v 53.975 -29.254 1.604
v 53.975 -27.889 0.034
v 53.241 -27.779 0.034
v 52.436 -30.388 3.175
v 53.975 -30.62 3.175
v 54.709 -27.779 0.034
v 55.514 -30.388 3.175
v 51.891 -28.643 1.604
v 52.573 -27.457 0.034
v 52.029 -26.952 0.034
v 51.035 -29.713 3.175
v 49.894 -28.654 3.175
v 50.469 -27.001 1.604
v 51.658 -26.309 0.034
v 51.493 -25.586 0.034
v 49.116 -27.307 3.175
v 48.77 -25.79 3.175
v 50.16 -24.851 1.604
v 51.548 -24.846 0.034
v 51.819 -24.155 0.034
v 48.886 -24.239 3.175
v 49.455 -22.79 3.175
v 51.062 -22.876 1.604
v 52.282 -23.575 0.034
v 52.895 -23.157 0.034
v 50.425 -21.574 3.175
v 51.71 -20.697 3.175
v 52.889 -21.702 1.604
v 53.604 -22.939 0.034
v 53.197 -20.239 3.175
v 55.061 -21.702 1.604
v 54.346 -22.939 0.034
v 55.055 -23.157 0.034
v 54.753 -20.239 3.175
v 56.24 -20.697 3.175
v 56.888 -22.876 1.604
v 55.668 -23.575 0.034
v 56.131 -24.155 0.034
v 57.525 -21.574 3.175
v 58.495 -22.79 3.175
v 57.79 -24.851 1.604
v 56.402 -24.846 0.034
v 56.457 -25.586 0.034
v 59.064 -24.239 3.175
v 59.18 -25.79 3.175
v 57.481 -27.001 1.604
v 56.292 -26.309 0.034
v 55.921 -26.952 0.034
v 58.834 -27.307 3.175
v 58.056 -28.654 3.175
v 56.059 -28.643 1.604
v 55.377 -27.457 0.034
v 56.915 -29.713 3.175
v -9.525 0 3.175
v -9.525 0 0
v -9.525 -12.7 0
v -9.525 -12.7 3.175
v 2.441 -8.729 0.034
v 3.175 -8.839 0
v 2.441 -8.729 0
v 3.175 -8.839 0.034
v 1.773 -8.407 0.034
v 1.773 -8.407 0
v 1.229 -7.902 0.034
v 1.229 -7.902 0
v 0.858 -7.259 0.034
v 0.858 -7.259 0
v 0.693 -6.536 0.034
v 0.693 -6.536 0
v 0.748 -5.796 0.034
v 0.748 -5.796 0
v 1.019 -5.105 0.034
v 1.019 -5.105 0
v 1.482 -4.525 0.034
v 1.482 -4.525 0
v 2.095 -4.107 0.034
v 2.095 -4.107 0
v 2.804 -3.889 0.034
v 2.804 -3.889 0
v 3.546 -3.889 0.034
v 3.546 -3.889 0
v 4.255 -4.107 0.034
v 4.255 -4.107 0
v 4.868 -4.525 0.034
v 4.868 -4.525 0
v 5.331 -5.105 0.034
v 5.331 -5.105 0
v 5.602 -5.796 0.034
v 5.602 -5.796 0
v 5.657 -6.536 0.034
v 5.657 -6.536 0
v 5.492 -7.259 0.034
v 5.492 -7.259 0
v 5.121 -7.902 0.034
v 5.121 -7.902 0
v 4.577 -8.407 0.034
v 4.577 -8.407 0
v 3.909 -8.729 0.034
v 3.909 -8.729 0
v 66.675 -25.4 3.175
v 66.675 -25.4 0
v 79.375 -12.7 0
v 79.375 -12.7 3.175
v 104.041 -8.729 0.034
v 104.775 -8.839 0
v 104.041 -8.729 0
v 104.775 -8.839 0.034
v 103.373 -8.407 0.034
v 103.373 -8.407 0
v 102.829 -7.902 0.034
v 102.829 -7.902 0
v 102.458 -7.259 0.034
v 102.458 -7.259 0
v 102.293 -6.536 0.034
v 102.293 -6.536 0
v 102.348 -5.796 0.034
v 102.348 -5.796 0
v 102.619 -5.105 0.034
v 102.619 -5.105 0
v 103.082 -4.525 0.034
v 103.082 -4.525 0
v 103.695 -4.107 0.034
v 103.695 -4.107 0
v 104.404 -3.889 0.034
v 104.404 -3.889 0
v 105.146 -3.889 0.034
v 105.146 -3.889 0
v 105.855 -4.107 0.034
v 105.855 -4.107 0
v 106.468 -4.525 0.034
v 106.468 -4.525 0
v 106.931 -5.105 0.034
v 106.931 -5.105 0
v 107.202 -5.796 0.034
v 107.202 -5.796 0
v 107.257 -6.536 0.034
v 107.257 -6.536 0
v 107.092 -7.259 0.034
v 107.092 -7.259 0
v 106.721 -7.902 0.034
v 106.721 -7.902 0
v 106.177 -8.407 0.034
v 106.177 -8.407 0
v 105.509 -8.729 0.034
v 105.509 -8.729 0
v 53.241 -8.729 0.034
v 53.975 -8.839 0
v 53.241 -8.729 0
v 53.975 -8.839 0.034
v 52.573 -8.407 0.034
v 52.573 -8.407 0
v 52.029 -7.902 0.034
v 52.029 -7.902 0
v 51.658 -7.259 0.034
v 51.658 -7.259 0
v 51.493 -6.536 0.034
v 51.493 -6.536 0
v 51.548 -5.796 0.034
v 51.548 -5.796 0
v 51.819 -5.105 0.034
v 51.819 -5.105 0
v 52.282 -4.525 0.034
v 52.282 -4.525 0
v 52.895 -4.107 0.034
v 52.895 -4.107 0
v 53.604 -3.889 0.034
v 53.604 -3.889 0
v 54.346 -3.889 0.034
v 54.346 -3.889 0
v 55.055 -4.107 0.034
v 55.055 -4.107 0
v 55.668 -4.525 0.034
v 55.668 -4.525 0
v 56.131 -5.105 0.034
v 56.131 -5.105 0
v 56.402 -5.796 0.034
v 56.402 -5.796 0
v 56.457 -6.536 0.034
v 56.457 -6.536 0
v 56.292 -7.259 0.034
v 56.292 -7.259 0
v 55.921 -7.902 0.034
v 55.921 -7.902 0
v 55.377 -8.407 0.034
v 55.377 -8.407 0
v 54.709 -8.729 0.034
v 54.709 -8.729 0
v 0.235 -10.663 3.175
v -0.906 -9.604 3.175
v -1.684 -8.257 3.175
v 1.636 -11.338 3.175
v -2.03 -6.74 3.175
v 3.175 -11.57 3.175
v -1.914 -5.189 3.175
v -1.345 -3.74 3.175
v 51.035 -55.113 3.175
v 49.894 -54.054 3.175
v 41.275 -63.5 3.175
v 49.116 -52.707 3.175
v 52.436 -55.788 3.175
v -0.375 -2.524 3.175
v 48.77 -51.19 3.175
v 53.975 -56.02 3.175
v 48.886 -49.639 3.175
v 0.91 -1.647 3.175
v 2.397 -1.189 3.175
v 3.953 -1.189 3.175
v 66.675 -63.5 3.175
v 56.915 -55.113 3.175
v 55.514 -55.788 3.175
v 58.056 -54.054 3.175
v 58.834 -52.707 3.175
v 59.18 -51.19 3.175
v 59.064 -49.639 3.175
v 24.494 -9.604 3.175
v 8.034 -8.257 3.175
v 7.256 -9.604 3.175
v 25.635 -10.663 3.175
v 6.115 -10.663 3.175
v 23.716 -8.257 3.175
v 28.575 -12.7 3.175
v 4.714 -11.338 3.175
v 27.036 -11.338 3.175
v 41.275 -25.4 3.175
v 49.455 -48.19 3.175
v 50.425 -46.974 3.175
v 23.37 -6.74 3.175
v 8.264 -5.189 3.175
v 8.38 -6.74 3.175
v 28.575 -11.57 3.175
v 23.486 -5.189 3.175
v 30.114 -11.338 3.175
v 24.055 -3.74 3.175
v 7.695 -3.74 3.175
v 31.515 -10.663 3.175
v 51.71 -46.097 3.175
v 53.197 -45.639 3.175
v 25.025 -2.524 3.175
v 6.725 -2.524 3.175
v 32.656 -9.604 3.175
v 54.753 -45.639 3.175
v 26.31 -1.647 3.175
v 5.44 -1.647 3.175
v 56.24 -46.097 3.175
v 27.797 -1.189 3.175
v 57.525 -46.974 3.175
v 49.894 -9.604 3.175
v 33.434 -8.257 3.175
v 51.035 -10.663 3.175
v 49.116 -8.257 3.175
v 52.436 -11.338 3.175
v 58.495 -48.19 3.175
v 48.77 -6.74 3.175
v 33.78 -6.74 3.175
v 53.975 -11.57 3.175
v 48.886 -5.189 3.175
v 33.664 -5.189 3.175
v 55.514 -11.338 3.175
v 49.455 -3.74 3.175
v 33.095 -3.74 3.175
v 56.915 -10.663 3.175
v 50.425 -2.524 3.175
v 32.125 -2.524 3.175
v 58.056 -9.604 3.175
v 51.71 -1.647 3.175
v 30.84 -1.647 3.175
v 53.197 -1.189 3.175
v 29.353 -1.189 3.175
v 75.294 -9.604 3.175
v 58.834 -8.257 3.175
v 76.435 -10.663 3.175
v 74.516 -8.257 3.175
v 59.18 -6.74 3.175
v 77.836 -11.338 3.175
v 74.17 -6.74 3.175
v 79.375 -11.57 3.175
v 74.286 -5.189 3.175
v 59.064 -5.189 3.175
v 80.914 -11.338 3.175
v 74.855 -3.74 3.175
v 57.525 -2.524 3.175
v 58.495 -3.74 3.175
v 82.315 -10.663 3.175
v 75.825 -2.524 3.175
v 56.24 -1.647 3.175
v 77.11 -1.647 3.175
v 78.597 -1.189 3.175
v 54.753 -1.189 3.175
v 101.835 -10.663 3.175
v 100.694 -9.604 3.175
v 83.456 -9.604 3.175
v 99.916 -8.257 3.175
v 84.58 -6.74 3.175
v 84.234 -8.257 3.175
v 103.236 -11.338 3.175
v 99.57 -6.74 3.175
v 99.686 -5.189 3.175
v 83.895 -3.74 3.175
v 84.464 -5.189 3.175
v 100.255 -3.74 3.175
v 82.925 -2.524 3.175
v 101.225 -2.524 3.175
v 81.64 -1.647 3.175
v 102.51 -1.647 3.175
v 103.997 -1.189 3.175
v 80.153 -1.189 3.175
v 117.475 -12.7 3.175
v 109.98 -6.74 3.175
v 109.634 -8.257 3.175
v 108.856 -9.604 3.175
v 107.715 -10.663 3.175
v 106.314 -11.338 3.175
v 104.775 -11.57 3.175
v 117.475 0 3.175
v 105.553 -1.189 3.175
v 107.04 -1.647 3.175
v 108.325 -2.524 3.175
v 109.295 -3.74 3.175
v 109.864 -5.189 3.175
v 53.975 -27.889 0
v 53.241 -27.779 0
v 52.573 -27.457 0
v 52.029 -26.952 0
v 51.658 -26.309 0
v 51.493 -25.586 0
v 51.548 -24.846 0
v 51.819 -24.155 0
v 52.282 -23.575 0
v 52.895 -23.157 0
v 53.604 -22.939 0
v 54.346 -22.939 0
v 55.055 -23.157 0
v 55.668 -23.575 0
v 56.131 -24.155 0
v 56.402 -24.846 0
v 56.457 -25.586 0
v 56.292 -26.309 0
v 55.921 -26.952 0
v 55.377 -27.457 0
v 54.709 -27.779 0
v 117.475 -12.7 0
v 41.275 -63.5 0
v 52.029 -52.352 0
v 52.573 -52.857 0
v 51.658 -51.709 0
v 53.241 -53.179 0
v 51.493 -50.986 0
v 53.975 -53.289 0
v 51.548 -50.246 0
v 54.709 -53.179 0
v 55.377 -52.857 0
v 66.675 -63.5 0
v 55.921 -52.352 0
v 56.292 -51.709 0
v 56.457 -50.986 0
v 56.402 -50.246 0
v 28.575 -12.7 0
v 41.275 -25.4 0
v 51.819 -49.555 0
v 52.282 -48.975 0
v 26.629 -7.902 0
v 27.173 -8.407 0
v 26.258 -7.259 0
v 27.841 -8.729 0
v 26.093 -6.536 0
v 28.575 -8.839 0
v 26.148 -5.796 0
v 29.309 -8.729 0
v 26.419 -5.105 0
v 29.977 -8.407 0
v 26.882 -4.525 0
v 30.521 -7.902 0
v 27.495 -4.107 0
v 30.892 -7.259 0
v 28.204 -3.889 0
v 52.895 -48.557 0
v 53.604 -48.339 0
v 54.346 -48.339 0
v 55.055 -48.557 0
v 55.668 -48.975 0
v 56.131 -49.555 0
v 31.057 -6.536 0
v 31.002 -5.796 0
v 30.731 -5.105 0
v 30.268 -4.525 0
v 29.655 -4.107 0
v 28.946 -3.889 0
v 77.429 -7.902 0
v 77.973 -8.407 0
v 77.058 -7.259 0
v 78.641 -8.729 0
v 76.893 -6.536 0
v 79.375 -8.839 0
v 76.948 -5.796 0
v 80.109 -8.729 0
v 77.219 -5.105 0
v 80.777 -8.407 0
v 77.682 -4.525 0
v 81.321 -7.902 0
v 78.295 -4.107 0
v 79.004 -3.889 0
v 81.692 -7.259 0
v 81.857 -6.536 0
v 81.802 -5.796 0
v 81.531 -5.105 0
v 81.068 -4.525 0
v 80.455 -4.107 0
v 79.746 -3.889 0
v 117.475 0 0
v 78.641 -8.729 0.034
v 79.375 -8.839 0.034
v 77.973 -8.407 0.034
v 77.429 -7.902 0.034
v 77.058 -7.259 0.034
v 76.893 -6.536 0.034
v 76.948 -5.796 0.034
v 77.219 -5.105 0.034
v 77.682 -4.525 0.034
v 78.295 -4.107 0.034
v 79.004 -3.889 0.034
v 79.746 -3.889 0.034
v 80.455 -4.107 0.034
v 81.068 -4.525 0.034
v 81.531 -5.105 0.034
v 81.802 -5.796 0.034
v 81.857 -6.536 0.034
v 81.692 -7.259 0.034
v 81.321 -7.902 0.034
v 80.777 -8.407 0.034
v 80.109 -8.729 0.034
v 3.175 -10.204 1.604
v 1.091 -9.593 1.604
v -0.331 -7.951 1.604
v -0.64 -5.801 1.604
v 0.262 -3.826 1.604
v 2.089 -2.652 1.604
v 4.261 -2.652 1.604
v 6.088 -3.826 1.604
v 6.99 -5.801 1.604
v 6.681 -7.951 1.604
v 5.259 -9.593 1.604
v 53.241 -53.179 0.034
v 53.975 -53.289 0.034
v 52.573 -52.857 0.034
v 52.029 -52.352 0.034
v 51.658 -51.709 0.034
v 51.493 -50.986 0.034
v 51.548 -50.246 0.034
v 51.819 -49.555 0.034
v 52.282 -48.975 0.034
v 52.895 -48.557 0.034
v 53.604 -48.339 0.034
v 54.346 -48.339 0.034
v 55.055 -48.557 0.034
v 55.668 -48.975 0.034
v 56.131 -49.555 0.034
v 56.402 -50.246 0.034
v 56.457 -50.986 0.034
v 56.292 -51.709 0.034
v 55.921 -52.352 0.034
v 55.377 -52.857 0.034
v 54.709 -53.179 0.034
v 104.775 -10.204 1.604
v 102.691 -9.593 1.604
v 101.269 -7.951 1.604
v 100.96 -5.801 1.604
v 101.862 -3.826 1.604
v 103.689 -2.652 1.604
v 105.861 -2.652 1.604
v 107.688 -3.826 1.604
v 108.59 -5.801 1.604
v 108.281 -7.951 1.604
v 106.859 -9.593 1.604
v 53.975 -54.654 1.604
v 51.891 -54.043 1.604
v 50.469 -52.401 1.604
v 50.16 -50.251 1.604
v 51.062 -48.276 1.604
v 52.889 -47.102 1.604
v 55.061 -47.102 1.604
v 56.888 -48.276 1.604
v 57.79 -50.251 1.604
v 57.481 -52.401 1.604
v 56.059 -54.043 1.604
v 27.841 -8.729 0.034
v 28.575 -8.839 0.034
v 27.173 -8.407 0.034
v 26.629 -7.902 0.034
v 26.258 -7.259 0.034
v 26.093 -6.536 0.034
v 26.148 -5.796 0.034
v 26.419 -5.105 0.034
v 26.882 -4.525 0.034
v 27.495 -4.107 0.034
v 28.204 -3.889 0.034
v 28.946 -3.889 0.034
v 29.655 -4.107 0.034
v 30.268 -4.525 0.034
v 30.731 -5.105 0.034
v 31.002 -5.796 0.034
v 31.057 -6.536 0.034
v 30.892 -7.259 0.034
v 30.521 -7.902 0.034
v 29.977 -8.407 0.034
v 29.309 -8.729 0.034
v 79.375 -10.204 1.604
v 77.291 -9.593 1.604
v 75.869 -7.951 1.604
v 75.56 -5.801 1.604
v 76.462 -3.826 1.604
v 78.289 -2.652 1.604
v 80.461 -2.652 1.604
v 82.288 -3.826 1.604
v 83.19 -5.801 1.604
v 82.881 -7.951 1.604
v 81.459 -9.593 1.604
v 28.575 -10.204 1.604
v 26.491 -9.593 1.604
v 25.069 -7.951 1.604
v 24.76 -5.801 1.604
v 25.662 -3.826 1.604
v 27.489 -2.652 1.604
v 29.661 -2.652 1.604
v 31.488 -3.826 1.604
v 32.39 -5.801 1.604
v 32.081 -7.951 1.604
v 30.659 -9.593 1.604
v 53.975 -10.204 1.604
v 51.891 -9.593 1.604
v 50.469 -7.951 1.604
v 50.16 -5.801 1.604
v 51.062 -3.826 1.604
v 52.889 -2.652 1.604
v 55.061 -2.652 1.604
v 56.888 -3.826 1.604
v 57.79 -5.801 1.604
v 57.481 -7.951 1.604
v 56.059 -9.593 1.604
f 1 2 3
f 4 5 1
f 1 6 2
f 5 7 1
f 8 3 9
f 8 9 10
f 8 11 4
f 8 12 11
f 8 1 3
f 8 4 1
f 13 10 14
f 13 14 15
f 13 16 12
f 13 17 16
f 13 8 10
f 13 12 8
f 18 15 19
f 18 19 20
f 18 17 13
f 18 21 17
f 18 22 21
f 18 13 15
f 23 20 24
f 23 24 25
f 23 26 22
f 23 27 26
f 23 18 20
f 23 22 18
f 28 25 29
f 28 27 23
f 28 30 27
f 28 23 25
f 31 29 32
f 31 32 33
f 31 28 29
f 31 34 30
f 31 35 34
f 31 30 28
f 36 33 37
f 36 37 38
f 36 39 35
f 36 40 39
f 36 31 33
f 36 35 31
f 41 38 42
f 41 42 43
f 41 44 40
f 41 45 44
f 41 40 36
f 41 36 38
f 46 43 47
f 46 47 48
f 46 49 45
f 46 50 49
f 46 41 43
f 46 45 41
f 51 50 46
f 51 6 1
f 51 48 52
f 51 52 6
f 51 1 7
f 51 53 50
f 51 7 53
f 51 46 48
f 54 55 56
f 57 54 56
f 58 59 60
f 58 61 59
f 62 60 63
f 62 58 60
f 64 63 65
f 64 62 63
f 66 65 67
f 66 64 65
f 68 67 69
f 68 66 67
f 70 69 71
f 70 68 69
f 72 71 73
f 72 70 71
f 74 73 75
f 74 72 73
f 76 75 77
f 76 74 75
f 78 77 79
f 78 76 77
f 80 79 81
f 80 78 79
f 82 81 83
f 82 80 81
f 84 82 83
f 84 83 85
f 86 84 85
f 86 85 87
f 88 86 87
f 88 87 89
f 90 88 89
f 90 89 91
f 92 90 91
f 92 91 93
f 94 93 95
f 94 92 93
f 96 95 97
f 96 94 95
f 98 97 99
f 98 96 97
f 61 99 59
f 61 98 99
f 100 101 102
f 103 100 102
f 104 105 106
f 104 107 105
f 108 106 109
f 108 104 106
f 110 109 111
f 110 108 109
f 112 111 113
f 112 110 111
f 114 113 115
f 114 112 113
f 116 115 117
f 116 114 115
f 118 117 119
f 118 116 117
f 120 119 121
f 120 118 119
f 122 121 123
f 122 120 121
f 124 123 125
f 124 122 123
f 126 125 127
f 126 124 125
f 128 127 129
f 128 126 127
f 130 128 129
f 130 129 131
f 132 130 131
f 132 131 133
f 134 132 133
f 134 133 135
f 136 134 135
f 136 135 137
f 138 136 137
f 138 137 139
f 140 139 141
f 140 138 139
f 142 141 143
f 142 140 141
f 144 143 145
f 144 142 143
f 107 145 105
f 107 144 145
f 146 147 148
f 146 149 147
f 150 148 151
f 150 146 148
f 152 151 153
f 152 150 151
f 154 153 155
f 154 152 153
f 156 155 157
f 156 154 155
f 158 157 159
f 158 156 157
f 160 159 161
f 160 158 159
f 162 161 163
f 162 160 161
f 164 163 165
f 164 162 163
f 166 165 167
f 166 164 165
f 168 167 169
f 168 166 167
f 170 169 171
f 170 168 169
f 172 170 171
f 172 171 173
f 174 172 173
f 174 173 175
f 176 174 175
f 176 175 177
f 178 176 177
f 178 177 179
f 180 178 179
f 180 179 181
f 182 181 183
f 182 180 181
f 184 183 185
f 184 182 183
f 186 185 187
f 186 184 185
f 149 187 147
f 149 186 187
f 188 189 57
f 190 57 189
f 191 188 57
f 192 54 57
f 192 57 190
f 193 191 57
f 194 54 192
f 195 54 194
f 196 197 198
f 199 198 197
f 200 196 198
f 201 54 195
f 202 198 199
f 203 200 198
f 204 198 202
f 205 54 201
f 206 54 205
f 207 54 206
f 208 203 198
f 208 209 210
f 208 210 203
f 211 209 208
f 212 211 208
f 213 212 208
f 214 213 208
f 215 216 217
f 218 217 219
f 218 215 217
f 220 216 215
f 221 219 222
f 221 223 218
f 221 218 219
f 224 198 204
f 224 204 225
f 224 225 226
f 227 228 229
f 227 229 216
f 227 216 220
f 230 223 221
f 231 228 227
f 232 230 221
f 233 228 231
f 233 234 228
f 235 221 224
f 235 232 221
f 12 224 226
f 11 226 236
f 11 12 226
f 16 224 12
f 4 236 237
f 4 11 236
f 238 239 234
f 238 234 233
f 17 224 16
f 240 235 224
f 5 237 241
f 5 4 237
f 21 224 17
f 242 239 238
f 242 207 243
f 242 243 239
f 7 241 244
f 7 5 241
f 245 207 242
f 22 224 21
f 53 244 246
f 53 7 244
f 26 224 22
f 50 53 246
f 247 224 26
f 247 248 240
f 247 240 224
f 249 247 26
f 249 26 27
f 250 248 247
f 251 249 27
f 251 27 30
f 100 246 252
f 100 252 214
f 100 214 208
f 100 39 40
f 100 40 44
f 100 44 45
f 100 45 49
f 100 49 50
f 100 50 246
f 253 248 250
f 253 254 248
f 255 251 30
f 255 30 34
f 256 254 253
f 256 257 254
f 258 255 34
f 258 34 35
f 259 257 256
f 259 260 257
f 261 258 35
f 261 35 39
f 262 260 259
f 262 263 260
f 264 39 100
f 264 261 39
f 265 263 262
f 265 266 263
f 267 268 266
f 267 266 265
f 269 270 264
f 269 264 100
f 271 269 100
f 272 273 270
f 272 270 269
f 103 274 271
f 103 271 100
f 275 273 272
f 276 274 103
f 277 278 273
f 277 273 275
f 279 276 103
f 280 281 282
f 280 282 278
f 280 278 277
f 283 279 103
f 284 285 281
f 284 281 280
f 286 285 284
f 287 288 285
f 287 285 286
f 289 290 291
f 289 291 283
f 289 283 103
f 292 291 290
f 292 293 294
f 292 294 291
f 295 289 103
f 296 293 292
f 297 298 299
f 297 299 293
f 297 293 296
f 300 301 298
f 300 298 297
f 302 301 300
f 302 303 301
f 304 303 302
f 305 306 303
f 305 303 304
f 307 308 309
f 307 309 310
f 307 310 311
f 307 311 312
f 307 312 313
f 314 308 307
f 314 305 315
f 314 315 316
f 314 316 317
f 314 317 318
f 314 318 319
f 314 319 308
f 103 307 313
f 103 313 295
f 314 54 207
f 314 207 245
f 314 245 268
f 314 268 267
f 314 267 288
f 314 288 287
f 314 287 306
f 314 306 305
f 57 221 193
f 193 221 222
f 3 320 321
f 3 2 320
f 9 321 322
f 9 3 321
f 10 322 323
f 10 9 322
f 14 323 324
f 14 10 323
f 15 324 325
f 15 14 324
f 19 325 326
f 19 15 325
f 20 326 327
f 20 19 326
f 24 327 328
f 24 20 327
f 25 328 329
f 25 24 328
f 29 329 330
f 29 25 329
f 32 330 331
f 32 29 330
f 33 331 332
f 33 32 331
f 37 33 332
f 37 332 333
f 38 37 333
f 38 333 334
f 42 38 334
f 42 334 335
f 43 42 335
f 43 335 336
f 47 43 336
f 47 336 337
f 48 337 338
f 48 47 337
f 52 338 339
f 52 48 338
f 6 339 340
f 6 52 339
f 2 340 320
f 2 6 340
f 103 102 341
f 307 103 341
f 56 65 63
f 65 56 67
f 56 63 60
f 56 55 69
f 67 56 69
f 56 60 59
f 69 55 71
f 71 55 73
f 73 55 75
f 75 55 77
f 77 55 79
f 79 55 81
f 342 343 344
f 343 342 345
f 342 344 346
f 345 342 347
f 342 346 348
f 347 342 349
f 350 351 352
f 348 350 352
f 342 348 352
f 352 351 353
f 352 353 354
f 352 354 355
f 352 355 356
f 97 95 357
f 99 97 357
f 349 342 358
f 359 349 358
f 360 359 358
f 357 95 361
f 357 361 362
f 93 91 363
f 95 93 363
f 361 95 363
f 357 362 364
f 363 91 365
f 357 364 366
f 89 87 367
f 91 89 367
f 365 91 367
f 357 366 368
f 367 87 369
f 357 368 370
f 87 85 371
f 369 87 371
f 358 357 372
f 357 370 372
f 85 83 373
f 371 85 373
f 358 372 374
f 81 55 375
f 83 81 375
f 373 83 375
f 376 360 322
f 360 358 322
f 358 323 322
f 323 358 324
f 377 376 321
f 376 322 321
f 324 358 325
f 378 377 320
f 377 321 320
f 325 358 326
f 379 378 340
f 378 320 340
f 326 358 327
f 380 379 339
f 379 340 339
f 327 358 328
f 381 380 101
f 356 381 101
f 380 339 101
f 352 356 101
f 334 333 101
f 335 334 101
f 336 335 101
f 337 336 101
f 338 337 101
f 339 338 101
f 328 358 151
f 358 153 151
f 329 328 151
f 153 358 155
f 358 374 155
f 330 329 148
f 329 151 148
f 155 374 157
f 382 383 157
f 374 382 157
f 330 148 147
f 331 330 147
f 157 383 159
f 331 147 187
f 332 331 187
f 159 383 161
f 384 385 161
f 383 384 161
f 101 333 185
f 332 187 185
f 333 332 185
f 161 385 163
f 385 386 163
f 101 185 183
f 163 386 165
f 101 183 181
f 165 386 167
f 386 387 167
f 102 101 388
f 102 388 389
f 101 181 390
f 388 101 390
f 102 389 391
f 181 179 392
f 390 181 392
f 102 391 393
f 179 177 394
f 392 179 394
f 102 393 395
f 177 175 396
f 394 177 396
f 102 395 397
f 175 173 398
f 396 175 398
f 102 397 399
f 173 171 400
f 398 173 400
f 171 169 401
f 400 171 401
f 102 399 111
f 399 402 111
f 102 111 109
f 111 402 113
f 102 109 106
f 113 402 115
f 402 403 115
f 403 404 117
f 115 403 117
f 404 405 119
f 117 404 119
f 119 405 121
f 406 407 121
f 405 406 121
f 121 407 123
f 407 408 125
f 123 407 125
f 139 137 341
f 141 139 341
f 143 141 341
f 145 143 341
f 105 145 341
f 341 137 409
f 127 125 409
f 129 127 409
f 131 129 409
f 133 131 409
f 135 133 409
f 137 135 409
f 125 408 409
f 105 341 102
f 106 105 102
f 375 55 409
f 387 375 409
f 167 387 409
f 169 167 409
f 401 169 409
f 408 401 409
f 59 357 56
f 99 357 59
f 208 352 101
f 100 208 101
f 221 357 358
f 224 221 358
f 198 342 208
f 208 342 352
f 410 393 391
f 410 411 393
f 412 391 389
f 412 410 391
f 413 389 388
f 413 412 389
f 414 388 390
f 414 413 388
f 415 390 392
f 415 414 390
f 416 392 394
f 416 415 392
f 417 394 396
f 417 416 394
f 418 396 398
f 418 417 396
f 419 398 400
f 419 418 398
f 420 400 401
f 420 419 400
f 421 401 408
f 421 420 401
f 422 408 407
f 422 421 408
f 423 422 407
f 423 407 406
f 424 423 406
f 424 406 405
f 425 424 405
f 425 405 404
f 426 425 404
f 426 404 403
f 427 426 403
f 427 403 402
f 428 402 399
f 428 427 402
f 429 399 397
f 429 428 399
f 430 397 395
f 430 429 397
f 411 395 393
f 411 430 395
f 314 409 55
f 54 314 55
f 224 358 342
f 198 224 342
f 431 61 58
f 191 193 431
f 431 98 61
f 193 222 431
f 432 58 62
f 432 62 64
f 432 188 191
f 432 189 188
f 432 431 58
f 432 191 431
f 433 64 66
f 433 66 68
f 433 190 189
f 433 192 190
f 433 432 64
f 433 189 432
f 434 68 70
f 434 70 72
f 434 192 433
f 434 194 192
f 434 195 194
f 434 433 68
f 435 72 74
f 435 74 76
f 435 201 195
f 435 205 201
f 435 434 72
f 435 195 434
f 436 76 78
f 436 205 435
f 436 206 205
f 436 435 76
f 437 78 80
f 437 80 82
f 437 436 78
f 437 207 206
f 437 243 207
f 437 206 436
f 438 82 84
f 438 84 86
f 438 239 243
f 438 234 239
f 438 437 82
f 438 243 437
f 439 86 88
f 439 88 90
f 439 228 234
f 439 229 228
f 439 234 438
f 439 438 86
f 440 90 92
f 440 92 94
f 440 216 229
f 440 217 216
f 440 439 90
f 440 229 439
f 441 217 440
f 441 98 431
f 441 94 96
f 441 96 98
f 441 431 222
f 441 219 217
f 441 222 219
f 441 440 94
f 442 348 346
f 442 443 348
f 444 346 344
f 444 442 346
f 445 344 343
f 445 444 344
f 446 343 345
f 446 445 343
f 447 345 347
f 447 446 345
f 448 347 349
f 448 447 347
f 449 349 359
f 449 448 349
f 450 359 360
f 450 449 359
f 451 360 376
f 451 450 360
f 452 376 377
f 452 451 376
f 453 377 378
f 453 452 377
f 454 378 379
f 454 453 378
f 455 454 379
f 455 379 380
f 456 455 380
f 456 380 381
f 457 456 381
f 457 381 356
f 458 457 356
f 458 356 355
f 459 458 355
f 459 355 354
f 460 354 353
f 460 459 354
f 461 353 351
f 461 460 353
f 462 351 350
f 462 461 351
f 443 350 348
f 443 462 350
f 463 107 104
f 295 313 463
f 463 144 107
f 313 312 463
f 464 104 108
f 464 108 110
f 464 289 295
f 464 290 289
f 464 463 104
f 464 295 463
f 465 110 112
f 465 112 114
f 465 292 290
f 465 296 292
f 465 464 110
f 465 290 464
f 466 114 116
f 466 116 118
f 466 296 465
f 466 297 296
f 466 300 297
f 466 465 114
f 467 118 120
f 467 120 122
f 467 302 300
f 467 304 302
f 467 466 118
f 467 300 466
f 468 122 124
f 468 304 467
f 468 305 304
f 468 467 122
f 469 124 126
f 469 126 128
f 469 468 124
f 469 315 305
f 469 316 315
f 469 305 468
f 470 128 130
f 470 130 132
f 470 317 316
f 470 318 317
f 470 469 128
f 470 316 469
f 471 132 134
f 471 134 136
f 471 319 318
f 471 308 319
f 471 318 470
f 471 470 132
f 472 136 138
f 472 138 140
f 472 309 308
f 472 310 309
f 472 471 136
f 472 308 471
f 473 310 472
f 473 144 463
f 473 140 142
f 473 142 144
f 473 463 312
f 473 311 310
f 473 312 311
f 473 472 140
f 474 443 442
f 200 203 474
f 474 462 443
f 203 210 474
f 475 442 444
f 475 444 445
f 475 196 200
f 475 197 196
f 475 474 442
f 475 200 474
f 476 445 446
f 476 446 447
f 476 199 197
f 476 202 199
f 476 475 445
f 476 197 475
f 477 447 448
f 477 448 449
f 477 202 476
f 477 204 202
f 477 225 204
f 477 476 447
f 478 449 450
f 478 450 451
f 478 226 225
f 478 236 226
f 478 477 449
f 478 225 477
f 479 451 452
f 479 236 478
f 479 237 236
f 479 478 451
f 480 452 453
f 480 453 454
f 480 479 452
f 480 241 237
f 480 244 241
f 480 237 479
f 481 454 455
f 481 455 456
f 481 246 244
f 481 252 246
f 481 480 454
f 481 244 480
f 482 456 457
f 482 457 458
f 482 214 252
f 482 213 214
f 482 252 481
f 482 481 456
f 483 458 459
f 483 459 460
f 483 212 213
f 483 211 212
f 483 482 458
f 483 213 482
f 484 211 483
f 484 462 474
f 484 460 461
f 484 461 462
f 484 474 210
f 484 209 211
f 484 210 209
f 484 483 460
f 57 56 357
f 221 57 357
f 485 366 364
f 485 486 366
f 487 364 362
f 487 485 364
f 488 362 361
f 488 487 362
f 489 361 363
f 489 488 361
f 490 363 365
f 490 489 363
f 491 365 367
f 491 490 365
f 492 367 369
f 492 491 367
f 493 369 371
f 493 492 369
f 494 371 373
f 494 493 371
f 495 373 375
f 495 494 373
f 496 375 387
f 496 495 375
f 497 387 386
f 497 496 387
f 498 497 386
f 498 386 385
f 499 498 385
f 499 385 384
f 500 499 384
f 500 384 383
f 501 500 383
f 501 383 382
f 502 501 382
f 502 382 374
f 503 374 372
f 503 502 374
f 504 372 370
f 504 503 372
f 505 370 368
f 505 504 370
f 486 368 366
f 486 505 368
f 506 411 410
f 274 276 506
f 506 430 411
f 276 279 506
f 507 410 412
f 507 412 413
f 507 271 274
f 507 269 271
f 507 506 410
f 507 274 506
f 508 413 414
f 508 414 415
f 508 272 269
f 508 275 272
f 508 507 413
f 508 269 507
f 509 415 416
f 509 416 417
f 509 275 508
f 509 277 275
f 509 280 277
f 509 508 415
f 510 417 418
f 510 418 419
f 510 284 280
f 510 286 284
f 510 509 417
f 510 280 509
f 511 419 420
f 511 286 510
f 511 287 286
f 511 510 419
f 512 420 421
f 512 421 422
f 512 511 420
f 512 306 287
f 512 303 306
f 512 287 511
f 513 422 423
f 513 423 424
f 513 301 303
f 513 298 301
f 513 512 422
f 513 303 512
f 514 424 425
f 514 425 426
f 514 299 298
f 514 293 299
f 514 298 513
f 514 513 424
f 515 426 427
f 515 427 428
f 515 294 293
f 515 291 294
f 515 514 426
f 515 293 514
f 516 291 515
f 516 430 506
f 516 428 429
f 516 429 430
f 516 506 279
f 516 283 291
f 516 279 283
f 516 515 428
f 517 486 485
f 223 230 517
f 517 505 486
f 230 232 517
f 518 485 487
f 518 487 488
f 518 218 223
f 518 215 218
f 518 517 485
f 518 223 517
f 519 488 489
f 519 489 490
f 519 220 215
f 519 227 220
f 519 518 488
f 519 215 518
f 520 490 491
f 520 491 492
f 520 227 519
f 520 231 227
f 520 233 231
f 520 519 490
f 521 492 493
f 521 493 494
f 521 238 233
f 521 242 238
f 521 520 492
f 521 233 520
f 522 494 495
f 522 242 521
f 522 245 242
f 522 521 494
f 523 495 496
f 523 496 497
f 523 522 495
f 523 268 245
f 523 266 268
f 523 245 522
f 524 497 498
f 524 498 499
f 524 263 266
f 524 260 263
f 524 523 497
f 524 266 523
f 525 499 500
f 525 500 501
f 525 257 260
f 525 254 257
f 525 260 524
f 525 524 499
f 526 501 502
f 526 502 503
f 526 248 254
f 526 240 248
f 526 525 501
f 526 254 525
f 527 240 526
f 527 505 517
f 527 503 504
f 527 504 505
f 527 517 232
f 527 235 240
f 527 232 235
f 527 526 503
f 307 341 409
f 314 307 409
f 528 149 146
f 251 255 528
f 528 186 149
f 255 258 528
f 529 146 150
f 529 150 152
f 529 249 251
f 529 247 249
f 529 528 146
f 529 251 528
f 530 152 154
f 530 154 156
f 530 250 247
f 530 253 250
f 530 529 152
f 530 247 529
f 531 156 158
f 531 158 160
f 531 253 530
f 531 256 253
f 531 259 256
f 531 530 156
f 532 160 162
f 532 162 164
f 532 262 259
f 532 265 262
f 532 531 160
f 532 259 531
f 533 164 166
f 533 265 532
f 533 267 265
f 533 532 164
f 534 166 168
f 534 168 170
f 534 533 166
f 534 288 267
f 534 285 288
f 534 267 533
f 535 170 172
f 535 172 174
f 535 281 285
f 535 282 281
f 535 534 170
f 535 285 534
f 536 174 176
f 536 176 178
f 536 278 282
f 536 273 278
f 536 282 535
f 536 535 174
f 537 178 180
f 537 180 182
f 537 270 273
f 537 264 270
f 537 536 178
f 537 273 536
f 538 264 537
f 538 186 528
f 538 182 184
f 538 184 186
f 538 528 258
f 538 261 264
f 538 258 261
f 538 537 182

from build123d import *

# Parameters (mm, degrees)
BOSS_EXTRUDE1_DEPTH             = 3.175
F_10_CLEARANCE_HOLE1_AT_2_COUNT = 2
F_10_CLEARANCE_HOLE1_AT_2_PITCH = 25.4
F_10_CLEARANCE_HOLE1_AT_3_COUNT = 2
F_10_CLEARANCE_HOLE1_AT_3_PITCH = 50.8
F_10_CLEARANCE_HOLE1_AT_4_COUNT = 2
F_10_CLEARANCE_HOLE1_AT_4_PITCH = 101.6
F_10_CLEARANCE_HOLE1_AT_5_COUNT = 2
F_10_CLEARANCE_HOLE1_AT_5_PITCH = 54.254423783
F_10_CLEARANCE_HOLE1_AT_6_COUNT = 2
F_10_CLEARANCE_HOLE1_AT_6_PITCH = 67.501425911
F_10_CLEARANCE_HOLE1_AT_7_COUNT = 2
F_10_CLEARANCE_HOLE1_AT_7_PITCH = 76.2


with BuildPart() as part:
    # Sketch1 → Boss-Extrude1 (new body)
    with BuildSketch(Plane.XY):
        Polygon((41.275, -25.4), (41.275, -63.5), (66.675, -63.5), (66.675, -25.4), (79.375, -12.7), (117.475, -12.7), (117.475, 0), (-9.525, 0), (-9.525, -12.7), (28.575, -12.7), align=None)
    extrude(amount=BOSS_EXTRUDE1_DEPTH)

    # Sketch5 → #10 Clearance Hole1 (revolve, cut)
    with BuildSketch(Plane(origin=(3.175, -6.35, 3.175), x_dir=(0, -1, 0), z_dir=(1, 0, 0))):
        Polygon((0, 0), (0, 3.175), (2.4892, 3.175), (2.4892, 3.141080936), (5.2197, 0), align=None)
    f_10_clearance_hole1 = revolve(axis=Axis((3.175, -6.35, 9.525), (0, 0, -1)), mode=Mode.SUBTRACT)

    # #10 Clearance Hole1 at 2: #10 Clearance Hole1 ×2
    with Locations(*[(i * F_10_CLEARANCE_HOLE1_AT_2_PITCH, 0, 0) for i in range(1, F_10_CLEARANCE_HOLE1_AT_2_COUNT)]):
        add(f_10_clearance_hole1, mode=Mode.SUBTRACT)

    # #10 Clearance Hole1 at 3: #10 Clearance Hole1 ×2
    with Locations(*[(i * F_10_CLEARANCE_HOLE1_AT_3_PITCH, 0, 0) for i in range(1, F_10_CLEARANCE_HOLE1_AT_3_COUNT)]):
        add(f_10_clearance_hole1, mode=Mode.SUBTRACT)

    # #10 Clearance Hole1 at 4: #10 Clearance Hole1 ×2
    with Locations(*[(i * F_10_CLEARANCE_HOLE1_AT_4_PITCH, 0, 0) for i in range(1, F_10_CLEARANCE_HOLE1_AT_4_COUNT)]):
        add(f_10_clearance_hole1, mode=Mode.SUBTRACT)

    # #10 Clearance Hole1 at 5: #10 Clearance Hole1 ×2
    with Locations(*[Vector(0.9363291775690471, -0.35112344158838477, 0) * (i * F_10_CLEARANCE_HOLE1_AT_5_PITCH) for i in range(1, F_10_CLEARANCE_HOLE1_AT_5_COUNT)]):
        add(f_10_clearance_hole1, mode=Mode.SUBTRACT)

    # #10 Clearance Hole1 at 6: #10 Clearance Hole1 ×2
    with Locations(*[Vector(0.7525766947068834, -0.6585046078685118, 0) * (i * F_10_CLEARANCE_HOLE1_AT_6_PITCH) for i in range(1, F_10_CLEARANCE_HOLE1_AT_6_COUNT)]):
        add(f_10_clearance_hole1, mode=Mode.SUBTRACT)

    # #10 Clearance Hole1 at 7: #10 Clearance Hole1 ×2
    with Locations(*[(i * F_10_CLEARANCE_HOLE1_AT_7_PITCH, 0, 0) for i in range(1, F_10_CLEARANCE_HOLE1_AT_7_COUNT)]):
        add(f_10_clearance_hole1, mode=Mode.SUBTRACT)


solid = part.part
